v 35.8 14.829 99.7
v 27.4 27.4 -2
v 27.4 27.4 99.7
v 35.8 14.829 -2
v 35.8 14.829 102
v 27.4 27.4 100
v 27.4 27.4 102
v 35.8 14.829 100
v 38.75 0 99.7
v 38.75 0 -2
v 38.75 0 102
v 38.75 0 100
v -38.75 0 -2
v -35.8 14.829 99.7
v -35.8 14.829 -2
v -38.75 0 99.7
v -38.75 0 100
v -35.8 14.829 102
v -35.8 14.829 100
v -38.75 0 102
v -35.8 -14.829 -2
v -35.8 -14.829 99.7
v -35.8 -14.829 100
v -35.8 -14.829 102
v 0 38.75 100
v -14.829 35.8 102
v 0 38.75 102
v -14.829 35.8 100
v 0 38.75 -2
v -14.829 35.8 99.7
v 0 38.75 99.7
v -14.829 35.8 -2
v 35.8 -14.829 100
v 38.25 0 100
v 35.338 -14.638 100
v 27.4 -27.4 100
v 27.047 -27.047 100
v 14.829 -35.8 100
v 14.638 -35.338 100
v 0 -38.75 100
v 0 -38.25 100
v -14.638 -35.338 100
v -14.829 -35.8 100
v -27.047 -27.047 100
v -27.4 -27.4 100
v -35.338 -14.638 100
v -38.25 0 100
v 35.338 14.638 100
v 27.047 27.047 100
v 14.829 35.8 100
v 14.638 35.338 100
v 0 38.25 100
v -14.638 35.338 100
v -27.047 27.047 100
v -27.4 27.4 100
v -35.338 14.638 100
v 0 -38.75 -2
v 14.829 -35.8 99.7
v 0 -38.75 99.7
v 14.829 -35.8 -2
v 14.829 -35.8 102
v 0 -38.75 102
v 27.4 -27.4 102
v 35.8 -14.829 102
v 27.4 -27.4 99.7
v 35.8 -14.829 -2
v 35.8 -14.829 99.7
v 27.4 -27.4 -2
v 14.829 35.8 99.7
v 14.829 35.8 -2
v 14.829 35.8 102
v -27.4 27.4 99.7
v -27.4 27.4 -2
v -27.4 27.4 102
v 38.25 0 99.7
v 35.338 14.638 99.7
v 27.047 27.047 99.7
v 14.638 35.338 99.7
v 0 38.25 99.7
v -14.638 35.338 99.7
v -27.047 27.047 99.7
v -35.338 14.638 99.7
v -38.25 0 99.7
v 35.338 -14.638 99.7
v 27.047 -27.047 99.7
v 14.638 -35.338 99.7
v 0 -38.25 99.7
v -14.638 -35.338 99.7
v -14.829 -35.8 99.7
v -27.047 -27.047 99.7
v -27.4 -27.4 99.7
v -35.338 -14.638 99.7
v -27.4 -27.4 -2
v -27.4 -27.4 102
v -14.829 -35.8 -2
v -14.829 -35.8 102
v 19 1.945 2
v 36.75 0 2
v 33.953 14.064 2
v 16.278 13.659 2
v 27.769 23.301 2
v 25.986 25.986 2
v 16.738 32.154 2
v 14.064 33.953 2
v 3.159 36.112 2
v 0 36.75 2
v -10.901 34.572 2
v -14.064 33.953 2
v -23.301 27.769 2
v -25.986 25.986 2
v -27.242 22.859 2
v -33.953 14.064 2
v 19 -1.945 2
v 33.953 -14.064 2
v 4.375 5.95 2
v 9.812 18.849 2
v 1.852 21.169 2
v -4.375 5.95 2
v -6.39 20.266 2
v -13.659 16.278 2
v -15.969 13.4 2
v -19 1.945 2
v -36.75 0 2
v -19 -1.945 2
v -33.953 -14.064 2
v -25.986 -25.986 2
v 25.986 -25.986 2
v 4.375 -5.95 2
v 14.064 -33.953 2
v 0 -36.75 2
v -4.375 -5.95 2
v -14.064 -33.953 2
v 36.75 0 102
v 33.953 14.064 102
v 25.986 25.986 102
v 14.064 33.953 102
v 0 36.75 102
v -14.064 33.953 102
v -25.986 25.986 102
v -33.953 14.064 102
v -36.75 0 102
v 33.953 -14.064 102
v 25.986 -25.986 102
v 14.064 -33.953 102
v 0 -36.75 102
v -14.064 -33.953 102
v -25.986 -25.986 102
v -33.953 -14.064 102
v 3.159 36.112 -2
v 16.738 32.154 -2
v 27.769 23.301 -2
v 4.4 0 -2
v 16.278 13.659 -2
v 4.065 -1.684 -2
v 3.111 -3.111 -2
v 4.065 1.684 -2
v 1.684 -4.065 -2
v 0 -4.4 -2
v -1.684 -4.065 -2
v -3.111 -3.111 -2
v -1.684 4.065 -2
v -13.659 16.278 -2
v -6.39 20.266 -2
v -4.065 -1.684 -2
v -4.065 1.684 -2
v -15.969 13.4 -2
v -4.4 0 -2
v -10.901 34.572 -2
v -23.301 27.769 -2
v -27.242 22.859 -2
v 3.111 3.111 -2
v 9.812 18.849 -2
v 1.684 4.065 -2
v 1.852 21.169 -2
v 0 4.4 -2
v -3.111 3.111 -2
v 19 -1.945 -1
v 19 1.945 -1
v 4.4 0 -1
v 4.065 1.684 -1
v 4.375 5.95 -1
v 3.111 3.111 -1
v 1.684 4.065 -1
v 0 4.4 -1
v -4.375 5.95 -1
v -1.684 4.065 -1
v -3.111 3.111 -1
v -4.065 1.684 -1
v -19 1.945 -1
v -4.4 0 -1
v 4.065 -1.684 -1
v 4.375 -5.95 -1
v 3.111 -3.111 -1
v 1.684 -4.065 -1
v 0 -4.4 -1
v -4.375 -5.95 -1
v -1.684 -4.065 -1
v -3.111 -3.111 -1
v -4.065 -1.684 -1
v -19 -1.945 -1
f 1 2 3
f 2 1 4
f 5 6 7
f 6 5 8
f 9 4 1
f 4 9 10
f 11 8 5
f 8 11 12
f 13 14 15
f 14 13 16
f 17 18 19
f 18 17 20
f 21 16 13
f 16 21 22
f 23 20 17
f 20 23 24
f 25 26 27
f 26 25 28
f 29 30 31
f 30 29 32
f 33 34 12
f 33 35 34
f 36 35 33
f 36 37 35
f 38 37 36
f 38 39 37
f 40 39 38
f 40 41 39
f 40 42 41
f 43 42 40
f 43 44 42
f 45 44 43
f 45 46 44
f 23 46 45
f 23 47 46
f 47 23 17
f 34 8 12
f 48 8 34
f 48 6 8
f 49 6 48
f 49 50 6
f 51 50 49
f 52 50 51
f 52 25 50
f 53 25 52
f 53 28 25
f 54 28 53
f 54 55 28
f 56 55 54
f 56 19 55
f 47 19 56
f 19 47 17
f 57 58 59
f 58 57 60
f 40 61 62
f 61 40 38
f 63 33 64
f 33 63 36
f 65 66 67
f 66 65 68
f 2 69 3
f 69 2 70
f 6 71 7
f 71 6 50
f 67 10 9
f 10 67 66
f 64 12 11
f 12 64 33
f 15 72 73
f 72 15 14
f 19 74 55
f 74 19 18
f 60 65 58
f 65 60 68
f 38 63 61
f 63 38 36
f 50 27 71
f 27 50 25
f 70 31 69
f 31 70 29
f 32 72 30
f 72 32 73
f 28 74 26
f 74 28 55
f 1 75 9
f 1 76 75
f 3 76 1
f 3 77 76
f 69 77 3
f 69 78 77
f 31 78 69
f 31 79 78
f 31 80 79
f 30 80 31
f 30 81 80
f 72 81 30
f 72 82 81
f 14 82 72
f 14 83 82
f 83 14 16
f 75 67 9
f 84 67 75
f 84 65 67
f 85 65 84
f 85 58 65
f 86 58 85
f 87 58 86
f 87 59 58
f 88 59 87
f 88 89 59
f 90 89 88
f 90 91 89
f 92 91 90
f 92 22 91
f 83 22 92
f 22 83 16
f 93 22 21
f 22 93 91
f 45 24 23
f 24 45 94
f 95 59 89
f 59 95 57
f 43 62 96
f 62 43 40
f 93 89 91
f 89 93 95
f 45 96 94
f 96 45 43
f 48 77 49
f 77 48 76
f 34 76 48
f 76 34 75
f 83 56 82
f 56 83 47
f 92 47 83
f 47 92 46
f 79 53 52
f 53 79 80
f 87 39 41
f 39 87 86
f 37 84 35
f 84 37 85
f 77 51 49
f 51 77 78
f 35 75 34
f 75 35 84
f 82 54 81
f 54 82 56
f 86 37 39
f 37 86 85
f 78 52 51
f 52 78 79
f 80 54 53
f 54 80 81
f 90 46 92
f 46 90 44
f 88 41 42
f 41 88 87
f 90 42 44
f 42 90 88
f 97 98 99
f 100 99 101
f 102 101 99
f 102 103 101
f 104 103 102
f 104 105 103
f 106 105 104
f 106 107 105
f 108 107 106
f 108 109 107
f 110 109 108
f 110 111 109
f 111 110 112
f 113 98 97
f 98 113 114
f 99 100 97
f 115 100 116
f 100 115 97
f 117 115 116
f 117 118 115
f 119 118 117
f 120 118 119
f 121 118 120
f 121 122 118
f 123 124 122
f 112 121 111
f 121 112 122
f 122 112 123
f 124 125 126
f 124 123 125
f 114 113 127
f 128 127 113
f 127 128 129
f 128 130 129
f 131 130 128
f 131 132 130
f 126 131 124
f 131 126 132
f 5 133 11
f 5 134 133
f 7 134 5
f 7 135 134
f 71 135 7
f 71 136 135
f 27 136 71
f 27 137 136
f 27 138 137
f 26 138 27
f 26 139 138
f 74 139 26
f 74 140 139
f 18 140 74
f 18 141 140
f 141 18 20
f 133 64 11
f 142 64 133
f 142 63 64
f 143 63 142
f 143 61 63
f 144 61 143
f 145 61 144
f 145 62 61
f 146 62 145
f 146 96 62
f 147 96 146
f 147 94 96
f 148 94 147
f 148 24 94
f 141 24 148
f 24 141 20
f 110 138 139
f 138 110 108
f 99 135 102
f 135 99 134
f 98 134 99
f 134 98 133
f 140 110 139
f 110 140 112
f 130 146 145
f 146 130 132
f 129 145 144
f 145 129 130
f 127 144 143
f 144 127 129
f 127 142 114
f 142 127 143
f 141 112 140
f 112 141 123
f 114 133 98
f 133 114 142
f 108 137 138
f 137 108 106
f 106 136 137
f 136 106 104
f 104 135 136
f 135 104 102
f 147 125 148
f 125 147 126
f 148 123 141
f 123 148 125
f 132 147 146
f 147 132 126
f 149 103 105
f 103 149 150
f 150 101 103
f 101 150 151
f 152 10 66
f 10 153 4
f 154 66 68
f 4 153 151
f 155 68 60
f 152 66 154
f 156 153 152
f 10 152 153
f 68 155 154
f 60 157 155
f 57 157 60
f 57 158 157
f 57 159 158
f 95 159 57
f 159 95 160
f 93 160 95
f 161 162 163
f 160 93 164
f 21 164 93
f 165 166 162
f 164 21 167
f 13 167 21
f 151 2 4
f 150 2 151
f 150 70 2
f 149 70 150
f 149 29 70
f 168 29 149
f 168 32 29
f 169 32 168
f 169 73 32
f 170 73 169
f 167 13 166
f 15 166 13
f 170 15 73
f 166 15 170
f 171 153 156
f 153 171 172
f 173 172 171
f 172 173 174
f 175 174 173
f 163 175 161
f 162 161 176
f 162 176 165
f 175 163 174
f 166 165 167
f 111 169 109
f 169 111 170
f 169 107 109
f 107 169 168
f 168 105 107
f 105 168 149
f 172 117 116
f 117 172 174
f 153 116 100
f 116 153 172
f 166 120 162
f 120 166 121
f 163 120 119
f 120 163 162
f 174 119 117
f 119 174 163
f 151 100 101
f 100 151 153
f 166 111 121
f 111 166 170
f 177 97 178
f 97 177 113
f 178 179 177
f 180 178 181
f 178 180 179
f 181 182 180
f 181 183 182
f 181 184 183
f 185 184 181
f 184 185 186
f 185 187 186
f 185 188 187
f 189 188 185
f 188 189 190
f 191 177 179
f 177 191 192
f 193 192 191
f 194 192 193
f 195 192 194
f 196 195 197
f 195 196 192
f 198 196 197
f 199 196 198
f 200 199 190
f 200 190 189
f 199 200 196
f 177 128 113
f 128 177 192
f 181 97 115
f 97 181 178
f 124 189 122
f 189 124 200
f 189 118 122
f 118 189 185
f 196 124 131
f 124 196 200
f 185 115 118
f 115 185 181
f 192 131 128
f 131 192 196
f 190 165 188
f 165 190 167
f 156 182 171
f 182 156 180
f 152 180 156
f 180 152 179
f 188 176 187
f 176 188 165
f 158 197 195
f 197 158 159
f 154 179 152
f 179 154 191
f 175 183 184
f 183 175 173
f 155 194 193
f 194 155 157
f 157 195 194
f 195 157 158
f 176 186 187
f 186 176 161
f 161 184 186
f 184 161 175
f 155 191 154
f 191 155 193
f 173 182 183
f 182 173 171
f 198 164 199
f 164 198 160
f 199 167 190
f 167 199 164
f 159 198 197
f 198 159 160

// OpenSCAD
//Oberer Zylinder
translate([0, 0, 52])difference(){
  // Zylinder
  cylinder($fn= 16, d=77.5, h=100,center = true);
  cylinder($fn= 16, d=73.5, h=100,center = true);
  
  // Rille für Pringelsdeckel
  translate([0, 0, 48-0.3/2])difference(){ 
    cylinder($fn= 16, d=77.5, h=0.3,center = true);
    cylinder($fn= 16, d=76.5, h=0.3,center = true);
  }
}

// Unterseite
difference(){
  cylinder($fn= 16, d=77.5, h=4,center = true);
  
  // Ausschnitt Futterdurchlass
  rotate([0, 0, 40])intersection(){
    difference(){
      cylinder($fn= 16, d=72.5, h=4,center = true);
      cylinder($fn= 16, d=42.5, h=4,center = true);
    }
  
    polyhedron(
      points=[ [0, 0,  2,], [75, 0,  2], [75*cos(100), 75*sin(100),  2],
               [0, 0, -2,], [75, 0, -2], [75*cos(100), 75*sin(100), -2] ],
      faces=
              [[0,1,2], // Unterer Deckel
              [0,4,1], // Abdeckung x-Seite
              [0,3,4], // Abdeckung x-Seite
              [0,5,3], // Abdeckung schiefe Seite
              [0,2,5], // Abdeckung schiefe Seite
              [1,5,2], // Abdeckung Hypothenuse
              [1,4,5], // Abdeckung Hypothenuse
              [3,5,4]  // Oberer Deckel
              ]
    );
  }
  
  // Ausschnitt für Fixierflügel 
  translate([0, 0, 0.5])union(){
    intersection(){
      cube([38, 11.9, 3], center = true);
      translate([14.625/2 + 8.75/2, 0, 0])rotate([0, 90, 0])rotate([0, 0, 45])cylinder($fn = 4, d1=11.9/(sin(45)), d2=5.5, h=14.625, center=true);
    }
    intersection(){
      cube([38, 11.9, 3], center = true);
      translate([-(14.625/2 + 8.75/2), 0, 0])rotate([0, 90, 0])rotate([0, 0, 45])cylinder($fn = 4, d1=5.5, d2=11.9/(sin(45)), h=14.625, center=true);
    }
    cube([8.75, 11.9 ,3], center = true);
  }
  
  // Loch für Fixierflügel
  translate([0, 0, -1.5])cylinder($fn= 16, d=8.8, h=1, center = true);
}
